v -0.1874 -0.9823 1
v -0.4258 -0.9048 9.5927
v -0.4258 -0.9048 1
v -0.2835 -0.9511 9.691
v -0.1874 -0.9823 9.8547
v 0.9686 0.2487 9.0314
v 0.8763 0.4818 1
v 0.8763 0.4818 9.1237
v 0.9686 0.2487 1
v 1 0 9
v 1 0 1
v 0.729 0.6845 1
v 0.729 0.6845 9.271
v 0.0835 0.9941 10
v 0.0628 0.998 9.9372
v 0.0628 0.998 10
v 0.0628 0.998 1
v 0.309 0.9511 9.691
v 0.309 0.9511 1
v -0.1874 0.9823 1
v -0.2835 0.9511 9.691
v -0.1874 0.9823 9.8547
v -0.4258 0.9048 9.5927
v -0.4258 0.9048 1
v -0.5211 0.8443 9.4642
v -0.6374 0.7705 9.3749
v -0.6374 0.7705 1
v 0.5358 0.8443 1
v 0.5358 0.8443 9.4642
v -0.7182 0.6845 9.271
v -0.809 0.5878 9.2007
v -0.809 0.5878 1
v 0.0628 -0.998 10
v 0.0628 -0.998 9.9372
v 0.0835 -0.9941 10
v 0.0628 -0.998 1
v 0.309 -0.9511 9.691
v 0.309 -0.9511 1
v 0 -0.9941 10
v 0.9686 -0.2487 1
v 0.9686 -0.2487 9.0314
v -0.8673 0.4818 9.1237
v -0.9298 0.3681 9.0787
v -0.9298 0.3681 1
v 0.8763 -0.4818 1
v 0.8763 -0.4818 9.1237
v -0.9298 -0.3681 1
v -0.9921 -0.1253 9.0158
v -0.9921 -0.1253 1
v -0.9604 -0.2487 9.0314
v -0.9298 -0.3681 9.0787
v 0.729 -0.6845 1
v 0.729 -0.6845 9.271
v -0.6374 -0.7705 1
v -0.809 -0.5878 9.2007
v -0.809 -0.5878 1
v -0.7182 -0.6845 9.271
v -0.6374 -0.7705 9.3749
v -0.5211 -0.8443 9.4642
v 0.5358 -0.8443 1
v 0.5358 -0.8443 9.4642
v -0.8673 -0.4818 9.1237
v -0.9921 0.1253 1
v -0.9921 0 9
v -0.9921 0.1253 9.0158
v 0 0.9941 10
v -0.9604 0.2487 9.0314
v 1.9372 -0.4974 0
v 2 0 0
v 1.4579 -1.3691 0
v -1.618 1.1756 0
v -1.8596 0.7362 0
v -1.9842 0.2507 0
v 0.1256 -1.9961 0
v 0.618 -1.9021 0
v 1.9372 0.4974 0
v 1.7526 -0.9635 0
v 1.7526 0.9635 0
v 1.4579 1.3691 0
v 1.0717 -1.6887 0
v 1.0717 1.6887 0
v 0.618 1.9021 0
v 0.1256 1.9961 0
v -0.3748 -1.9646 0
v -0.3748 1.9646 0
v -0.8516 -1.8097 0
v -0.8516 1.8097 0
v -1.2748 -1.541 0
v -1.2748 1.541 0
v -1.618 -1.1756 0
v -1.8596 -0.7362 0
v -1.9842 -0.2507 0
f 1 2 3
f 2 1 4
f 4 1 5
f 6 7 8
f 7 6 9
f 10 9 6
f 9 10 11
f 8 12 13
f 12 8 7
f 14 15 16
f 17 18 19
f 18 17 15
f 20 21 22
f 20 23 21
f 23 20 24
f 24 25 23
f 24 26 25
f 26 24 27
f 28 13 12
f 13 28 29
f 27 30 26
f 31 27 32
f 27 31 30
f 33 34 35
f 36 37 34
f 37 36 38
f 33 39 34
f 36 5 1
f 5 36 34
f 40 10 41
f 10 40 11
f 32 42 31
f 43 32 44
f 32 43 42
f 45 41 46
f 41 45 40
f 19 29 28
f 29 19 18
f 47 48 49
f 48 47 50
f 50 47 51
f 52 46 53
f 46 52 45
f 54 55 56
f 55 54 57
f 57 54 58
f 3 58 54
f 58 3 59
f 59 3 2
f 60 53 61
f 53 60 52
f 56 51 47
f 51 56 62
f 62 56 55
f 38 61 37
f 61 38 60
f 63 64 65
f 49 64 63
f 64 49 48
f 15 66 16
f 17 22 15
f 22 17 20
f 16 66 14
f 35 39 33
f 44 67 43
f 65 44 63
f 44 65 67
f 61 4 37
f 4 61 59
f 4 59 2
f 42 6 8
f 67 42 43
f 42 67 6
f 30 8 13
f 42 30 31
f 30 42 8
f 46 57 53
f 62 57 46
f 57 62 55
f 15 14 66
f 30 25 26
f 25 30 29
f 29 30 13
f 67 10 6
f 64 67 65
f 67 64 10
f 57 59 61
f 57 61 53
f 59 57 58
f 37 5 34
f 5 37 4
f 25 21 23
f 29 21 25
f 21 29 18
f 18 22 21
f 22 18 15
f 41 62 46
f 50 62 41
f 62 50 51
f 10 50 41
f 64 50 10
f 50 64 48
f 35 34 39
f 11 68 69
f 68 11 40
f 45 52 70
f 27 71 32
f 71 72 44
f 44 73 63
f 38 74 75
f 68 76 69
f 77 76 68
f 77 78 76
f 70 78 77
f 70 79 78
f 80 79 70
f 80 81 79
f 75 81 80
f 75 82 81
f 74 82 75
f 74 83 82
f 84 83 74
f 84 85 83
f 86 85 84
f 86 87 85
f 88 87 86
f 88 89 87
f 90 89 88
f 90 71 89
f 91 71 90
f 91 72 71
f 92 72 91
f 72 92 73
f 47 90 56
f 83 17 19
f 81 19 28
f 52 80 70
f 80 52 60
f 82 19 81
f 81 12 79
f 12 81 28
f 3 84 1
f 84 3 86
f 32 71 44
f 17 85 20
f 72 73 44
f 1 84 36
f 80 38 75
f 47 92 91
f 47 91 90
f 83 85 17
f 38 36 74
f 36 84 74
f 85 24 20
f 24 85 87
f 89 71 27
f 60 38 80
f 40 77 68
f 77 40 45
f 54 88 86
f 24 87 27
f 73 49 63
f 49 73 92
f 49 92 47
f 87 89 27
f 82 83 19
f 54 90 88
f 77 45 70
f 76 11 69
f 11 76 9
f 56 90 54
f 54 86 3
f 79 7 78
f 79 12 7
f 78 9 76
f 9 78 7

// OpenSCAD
// file: base.scad
module base(r,h,$fn=$fn) {
    linear_extrude(h,scale = 0.5) {
        circle(r*2);
    }
}

base(1,1);
// file: support.scad
module support(h,r=1,dir=0,slope=90,$fn=$fn) {
    difference(){
        cylinder(h,r=r);
        translate([0,0,h])
        rotate([0,slope,dir])
        cylinder(h,r=r,center=true);
    }
}

support(10,1,dir=45,$fn=25);
// main file
use <support.scad>
use <base.scad>

module base_support(h=10,r=1,bh=1,dir=0,slope=90,$fn=$fn) {
    union() {
        base(r,bh);
        translate([0,0,bh])
        support(h-bh,r,dir,slope);
    }
}

base_support(10,1,bh=1,$fn=25);
